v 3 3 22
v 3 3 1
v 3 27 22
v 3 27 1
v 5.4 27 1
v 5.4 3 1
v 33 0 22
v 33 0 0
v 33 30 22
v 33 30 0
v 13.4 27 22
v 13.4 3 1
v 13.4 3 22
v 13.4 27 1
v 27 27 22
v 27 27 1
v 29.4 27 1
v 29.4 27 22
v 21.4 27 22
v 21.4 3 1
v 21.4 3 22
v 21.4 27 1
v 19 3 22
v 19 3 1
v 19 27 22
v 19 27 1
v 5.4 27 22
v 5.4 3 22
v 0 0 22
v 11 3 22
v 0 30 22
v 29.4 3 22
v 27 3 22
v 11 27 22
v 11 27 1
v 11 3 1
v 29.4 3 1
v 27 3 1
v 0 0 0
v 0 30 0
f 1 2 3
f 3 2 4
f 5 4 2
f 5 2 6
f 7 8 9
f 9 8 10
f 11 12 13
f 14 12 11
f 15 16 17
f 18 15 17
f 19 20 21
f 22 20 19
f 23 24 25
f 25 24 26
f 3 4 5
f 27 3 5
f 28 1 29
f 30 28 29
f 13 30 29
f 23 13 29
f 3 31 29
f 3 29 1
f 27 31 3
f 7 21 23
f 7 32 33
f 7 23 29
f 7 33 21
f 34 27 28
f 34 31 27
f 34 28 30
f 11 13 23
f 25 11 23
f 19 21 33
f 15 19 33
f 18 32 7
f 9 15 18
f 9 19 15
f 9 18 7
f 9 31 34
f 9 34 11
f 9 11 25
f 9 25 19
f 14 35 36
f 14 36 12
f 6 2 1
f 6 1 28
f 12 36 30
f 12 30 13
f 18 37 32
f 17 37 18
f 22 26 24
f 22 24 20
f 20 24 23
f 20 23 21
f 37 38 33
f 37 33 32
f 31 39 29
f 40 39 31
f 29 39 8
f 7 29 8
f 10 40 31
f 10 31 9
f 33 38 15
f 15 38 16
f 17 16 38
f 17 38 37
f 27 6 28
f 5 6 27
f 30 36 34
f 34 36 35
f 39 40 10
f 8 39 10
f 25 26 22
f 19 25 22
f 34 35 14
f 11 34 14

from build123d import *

# Parameters (mm, degrees)
BOX_W        = 2.4
BOX_H        = 24
BOX_DEPTH    = 22
BOX001_W     = 2.4
BOX001_H     = 24
BOX001_DEPTH = 22
BOX002_W     = 2.4
BOX002_H     = 24
BOX002_DEPTH = 22
BOX003_W     = 2.4
BOX003_H     = 24
BOX003_DEPTH = 22
BOX004_W     = 33
BOX004_H     = 30
BOX004_DEPTH = 22


with BuildPart() as ranura1:
    # Box → Box (new body)
    with BuildSketch(Plane.XY):
        with Locations((1.2, 12)):
            Rectangle(BOX_W, BOX_H)
    extrude(amount=BOX_DEPTH)


with BuildPart() as ranura002:
    # Box001 → Box001 (new body)
    with BuildSketch(Plane(origin=(8, 0, 0), x_dir=(1, 0, 0), z_dir=(0, 0, 1))):
        with Locations((1.2, 12)):
            Rectangle(BOX001_W, BOX001_H)
    extrude(amount=BOX001_DEPTH)


with BuildPart() as ranura003:
    # Box002 → Box002 (new body)
    with BuildSketch(Plane(origin=(16, 0, 0), x_dir=(1, 0, 0), z_dir=(0, 0, 1))):
        with Locations((1.2, 12)):
            Rectangle(BOX002_W, BOX002_H)
    extrude(amount=BOX002_DEPTH)


with BuildPart() as fusion:
    # Box003 → Box003 (new body)
    with BuildSketch(Plane(origin=(24, 0, 0), x_dir=(1, 0, 0), z_dir=(0, 0, 1))):
        with Locations((1.2, 12)):
            Rectangle(BOX003_W, BOX003_H)
    extrude(amount=BOX003_DEPTH)

    # Fusion: union Ranura1, Ranura002, Ranura003
    add(ranura1.part)
    add(ranura002.part)
    add(ranura003.part)


with BuildPart() as fusion_1:
    # Fusion placement: moved
    add(fusion.part.moved(Location((3, 3, 1))))


with BuildPart() as cut:
    # Box004 → Box004 (new body)
    with BuildSketch(Plane.XY):
        with Locations((16.5, 15)):
            Rectangle(BOX004_W, BOX004_H)
    extrude(amount=BOX004_DEPTH)

    # Cut: cut Fusion
    add(fusion_1.part, mode=Mode.SUBTRACT)


solid = cut.part
